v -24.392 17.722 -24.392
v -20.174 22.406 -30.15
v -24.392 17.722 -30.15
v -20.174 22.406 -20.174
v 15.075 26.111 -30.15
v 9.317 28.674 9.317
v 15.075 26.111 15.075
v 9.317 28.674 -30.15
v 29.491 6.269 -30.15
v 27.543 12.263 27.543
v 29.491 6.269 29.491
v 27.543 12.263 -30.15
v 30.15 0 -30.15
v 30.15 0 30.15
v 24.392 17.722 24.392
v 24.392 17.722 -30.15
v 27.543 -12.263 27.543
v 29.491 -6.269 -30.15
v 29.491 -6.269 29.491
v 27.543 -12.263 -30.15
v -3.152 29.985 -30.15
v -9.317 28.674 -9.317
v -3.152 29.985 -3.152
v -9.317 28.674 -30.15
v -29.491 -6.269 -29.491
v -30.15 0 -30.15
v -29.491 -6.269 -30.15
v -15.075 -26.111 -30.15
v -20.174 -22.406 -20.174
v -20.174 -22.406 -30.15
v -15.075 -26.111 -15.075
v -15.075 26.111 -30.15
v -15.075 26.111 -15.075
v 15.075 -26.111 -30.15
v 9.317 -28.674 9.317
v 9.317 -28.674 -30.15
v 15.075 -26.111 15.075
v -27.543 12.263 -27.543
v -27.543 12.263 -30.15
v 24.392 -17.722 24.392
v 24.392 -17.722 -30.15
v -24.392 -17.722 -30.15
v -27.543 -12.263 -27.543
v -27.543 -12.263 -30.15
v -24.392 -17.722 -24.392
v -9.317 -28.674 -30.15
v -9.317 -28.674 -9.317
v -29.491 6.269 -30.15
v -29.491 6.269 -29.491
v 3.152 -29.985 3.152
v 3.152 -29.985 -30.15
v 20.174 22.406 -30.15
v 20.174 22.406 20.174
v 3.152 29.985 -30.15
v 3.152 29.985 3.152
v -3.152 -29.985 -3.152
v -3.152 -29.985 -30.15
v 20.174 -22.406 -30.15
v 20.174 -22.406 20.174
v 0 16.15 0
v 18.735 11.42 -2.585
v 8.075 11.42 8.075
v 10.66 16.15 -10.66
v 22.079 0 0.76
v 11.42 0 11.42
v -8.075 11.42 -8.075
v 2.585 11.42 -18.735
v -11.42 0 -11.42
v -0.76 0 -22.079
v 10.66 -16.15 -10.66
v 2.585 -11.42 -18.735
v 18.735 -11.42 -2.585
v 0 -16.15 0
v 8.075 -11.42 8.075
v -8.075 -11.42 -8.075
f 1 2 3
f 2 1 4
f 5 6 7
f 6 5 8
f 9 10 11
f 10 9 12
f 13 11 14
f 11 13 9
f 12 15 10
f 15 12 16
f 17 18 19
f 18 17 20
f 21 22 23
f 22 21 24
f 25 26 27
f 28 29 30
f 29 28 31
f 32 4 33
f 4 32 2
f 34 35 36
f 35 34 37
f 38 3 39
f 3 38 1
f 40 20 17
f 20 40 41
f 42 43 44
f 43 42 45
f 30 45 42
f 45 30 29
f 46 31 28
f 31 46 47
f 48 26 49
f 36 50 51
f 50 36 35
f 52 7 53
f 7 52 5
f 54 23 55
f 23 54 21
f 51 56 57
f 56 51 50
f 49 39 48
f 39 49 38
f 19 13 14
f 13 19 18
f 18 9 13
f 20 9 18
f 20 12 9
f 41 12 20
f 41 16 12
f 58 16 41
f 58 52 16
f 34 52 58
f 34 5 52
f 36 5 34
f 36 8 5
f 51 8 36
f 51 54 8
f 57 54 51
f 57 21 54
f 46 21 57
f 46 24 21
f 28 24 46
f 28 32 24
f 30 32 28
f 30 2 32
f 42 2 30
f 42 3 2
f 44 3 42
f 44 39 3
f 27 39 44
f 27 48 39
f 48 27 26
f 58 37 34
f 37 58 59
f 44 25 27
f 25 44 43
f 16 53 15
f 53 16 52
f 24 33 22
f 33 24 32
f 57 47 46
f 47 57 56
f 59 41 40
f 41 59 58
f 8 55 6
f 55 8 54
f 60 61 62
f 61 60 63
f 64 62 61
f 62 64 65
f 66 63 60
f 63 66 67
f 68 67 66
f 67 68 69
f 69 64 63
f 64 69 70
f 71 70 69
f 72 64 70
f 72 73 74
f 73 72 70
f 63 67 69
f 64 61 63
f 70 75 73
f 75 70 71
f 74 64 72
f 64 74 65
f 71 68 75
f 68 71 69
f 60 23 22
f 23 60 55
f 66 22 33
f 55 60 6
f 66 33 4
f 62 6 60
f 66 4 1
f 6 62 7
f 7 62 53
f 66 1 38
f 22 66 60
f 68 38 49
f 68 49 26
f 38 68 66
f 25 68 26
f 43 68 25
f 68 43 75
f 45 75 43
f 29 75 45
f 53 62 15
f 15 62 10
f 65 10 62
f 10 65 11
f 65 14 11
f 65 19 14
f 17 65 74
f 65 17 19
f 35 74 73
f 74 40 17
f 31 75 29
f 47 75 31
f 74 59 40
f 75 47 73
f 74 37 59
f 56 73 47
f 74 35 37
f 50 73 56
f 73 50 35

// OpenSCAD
mitre();
module mitre(od=60.3,angle=45,t=14,spigot=false){
    spigotDia=od-2*t;
    id=od-2*t;
    height=sin(angle)/cos(angle)*od;
    //translate([0,0,-x/cos(angle)/2])
    difference(){
        cylinder(h=height,d=od,center=true);
        rotate([0,-angle,0])cylinder(h=height/2,d=id,$fn=8,center=true);
        translate([-od/2,-od/2,-height/2])
        rotate([0,-angle,0])
        cube([od/cos(angle),od,od]);
    }
    if(spigot)
        rotate([0,-angle,0])
        cylinder(h=t,d=id,$fn=8,center=true);   
}  
